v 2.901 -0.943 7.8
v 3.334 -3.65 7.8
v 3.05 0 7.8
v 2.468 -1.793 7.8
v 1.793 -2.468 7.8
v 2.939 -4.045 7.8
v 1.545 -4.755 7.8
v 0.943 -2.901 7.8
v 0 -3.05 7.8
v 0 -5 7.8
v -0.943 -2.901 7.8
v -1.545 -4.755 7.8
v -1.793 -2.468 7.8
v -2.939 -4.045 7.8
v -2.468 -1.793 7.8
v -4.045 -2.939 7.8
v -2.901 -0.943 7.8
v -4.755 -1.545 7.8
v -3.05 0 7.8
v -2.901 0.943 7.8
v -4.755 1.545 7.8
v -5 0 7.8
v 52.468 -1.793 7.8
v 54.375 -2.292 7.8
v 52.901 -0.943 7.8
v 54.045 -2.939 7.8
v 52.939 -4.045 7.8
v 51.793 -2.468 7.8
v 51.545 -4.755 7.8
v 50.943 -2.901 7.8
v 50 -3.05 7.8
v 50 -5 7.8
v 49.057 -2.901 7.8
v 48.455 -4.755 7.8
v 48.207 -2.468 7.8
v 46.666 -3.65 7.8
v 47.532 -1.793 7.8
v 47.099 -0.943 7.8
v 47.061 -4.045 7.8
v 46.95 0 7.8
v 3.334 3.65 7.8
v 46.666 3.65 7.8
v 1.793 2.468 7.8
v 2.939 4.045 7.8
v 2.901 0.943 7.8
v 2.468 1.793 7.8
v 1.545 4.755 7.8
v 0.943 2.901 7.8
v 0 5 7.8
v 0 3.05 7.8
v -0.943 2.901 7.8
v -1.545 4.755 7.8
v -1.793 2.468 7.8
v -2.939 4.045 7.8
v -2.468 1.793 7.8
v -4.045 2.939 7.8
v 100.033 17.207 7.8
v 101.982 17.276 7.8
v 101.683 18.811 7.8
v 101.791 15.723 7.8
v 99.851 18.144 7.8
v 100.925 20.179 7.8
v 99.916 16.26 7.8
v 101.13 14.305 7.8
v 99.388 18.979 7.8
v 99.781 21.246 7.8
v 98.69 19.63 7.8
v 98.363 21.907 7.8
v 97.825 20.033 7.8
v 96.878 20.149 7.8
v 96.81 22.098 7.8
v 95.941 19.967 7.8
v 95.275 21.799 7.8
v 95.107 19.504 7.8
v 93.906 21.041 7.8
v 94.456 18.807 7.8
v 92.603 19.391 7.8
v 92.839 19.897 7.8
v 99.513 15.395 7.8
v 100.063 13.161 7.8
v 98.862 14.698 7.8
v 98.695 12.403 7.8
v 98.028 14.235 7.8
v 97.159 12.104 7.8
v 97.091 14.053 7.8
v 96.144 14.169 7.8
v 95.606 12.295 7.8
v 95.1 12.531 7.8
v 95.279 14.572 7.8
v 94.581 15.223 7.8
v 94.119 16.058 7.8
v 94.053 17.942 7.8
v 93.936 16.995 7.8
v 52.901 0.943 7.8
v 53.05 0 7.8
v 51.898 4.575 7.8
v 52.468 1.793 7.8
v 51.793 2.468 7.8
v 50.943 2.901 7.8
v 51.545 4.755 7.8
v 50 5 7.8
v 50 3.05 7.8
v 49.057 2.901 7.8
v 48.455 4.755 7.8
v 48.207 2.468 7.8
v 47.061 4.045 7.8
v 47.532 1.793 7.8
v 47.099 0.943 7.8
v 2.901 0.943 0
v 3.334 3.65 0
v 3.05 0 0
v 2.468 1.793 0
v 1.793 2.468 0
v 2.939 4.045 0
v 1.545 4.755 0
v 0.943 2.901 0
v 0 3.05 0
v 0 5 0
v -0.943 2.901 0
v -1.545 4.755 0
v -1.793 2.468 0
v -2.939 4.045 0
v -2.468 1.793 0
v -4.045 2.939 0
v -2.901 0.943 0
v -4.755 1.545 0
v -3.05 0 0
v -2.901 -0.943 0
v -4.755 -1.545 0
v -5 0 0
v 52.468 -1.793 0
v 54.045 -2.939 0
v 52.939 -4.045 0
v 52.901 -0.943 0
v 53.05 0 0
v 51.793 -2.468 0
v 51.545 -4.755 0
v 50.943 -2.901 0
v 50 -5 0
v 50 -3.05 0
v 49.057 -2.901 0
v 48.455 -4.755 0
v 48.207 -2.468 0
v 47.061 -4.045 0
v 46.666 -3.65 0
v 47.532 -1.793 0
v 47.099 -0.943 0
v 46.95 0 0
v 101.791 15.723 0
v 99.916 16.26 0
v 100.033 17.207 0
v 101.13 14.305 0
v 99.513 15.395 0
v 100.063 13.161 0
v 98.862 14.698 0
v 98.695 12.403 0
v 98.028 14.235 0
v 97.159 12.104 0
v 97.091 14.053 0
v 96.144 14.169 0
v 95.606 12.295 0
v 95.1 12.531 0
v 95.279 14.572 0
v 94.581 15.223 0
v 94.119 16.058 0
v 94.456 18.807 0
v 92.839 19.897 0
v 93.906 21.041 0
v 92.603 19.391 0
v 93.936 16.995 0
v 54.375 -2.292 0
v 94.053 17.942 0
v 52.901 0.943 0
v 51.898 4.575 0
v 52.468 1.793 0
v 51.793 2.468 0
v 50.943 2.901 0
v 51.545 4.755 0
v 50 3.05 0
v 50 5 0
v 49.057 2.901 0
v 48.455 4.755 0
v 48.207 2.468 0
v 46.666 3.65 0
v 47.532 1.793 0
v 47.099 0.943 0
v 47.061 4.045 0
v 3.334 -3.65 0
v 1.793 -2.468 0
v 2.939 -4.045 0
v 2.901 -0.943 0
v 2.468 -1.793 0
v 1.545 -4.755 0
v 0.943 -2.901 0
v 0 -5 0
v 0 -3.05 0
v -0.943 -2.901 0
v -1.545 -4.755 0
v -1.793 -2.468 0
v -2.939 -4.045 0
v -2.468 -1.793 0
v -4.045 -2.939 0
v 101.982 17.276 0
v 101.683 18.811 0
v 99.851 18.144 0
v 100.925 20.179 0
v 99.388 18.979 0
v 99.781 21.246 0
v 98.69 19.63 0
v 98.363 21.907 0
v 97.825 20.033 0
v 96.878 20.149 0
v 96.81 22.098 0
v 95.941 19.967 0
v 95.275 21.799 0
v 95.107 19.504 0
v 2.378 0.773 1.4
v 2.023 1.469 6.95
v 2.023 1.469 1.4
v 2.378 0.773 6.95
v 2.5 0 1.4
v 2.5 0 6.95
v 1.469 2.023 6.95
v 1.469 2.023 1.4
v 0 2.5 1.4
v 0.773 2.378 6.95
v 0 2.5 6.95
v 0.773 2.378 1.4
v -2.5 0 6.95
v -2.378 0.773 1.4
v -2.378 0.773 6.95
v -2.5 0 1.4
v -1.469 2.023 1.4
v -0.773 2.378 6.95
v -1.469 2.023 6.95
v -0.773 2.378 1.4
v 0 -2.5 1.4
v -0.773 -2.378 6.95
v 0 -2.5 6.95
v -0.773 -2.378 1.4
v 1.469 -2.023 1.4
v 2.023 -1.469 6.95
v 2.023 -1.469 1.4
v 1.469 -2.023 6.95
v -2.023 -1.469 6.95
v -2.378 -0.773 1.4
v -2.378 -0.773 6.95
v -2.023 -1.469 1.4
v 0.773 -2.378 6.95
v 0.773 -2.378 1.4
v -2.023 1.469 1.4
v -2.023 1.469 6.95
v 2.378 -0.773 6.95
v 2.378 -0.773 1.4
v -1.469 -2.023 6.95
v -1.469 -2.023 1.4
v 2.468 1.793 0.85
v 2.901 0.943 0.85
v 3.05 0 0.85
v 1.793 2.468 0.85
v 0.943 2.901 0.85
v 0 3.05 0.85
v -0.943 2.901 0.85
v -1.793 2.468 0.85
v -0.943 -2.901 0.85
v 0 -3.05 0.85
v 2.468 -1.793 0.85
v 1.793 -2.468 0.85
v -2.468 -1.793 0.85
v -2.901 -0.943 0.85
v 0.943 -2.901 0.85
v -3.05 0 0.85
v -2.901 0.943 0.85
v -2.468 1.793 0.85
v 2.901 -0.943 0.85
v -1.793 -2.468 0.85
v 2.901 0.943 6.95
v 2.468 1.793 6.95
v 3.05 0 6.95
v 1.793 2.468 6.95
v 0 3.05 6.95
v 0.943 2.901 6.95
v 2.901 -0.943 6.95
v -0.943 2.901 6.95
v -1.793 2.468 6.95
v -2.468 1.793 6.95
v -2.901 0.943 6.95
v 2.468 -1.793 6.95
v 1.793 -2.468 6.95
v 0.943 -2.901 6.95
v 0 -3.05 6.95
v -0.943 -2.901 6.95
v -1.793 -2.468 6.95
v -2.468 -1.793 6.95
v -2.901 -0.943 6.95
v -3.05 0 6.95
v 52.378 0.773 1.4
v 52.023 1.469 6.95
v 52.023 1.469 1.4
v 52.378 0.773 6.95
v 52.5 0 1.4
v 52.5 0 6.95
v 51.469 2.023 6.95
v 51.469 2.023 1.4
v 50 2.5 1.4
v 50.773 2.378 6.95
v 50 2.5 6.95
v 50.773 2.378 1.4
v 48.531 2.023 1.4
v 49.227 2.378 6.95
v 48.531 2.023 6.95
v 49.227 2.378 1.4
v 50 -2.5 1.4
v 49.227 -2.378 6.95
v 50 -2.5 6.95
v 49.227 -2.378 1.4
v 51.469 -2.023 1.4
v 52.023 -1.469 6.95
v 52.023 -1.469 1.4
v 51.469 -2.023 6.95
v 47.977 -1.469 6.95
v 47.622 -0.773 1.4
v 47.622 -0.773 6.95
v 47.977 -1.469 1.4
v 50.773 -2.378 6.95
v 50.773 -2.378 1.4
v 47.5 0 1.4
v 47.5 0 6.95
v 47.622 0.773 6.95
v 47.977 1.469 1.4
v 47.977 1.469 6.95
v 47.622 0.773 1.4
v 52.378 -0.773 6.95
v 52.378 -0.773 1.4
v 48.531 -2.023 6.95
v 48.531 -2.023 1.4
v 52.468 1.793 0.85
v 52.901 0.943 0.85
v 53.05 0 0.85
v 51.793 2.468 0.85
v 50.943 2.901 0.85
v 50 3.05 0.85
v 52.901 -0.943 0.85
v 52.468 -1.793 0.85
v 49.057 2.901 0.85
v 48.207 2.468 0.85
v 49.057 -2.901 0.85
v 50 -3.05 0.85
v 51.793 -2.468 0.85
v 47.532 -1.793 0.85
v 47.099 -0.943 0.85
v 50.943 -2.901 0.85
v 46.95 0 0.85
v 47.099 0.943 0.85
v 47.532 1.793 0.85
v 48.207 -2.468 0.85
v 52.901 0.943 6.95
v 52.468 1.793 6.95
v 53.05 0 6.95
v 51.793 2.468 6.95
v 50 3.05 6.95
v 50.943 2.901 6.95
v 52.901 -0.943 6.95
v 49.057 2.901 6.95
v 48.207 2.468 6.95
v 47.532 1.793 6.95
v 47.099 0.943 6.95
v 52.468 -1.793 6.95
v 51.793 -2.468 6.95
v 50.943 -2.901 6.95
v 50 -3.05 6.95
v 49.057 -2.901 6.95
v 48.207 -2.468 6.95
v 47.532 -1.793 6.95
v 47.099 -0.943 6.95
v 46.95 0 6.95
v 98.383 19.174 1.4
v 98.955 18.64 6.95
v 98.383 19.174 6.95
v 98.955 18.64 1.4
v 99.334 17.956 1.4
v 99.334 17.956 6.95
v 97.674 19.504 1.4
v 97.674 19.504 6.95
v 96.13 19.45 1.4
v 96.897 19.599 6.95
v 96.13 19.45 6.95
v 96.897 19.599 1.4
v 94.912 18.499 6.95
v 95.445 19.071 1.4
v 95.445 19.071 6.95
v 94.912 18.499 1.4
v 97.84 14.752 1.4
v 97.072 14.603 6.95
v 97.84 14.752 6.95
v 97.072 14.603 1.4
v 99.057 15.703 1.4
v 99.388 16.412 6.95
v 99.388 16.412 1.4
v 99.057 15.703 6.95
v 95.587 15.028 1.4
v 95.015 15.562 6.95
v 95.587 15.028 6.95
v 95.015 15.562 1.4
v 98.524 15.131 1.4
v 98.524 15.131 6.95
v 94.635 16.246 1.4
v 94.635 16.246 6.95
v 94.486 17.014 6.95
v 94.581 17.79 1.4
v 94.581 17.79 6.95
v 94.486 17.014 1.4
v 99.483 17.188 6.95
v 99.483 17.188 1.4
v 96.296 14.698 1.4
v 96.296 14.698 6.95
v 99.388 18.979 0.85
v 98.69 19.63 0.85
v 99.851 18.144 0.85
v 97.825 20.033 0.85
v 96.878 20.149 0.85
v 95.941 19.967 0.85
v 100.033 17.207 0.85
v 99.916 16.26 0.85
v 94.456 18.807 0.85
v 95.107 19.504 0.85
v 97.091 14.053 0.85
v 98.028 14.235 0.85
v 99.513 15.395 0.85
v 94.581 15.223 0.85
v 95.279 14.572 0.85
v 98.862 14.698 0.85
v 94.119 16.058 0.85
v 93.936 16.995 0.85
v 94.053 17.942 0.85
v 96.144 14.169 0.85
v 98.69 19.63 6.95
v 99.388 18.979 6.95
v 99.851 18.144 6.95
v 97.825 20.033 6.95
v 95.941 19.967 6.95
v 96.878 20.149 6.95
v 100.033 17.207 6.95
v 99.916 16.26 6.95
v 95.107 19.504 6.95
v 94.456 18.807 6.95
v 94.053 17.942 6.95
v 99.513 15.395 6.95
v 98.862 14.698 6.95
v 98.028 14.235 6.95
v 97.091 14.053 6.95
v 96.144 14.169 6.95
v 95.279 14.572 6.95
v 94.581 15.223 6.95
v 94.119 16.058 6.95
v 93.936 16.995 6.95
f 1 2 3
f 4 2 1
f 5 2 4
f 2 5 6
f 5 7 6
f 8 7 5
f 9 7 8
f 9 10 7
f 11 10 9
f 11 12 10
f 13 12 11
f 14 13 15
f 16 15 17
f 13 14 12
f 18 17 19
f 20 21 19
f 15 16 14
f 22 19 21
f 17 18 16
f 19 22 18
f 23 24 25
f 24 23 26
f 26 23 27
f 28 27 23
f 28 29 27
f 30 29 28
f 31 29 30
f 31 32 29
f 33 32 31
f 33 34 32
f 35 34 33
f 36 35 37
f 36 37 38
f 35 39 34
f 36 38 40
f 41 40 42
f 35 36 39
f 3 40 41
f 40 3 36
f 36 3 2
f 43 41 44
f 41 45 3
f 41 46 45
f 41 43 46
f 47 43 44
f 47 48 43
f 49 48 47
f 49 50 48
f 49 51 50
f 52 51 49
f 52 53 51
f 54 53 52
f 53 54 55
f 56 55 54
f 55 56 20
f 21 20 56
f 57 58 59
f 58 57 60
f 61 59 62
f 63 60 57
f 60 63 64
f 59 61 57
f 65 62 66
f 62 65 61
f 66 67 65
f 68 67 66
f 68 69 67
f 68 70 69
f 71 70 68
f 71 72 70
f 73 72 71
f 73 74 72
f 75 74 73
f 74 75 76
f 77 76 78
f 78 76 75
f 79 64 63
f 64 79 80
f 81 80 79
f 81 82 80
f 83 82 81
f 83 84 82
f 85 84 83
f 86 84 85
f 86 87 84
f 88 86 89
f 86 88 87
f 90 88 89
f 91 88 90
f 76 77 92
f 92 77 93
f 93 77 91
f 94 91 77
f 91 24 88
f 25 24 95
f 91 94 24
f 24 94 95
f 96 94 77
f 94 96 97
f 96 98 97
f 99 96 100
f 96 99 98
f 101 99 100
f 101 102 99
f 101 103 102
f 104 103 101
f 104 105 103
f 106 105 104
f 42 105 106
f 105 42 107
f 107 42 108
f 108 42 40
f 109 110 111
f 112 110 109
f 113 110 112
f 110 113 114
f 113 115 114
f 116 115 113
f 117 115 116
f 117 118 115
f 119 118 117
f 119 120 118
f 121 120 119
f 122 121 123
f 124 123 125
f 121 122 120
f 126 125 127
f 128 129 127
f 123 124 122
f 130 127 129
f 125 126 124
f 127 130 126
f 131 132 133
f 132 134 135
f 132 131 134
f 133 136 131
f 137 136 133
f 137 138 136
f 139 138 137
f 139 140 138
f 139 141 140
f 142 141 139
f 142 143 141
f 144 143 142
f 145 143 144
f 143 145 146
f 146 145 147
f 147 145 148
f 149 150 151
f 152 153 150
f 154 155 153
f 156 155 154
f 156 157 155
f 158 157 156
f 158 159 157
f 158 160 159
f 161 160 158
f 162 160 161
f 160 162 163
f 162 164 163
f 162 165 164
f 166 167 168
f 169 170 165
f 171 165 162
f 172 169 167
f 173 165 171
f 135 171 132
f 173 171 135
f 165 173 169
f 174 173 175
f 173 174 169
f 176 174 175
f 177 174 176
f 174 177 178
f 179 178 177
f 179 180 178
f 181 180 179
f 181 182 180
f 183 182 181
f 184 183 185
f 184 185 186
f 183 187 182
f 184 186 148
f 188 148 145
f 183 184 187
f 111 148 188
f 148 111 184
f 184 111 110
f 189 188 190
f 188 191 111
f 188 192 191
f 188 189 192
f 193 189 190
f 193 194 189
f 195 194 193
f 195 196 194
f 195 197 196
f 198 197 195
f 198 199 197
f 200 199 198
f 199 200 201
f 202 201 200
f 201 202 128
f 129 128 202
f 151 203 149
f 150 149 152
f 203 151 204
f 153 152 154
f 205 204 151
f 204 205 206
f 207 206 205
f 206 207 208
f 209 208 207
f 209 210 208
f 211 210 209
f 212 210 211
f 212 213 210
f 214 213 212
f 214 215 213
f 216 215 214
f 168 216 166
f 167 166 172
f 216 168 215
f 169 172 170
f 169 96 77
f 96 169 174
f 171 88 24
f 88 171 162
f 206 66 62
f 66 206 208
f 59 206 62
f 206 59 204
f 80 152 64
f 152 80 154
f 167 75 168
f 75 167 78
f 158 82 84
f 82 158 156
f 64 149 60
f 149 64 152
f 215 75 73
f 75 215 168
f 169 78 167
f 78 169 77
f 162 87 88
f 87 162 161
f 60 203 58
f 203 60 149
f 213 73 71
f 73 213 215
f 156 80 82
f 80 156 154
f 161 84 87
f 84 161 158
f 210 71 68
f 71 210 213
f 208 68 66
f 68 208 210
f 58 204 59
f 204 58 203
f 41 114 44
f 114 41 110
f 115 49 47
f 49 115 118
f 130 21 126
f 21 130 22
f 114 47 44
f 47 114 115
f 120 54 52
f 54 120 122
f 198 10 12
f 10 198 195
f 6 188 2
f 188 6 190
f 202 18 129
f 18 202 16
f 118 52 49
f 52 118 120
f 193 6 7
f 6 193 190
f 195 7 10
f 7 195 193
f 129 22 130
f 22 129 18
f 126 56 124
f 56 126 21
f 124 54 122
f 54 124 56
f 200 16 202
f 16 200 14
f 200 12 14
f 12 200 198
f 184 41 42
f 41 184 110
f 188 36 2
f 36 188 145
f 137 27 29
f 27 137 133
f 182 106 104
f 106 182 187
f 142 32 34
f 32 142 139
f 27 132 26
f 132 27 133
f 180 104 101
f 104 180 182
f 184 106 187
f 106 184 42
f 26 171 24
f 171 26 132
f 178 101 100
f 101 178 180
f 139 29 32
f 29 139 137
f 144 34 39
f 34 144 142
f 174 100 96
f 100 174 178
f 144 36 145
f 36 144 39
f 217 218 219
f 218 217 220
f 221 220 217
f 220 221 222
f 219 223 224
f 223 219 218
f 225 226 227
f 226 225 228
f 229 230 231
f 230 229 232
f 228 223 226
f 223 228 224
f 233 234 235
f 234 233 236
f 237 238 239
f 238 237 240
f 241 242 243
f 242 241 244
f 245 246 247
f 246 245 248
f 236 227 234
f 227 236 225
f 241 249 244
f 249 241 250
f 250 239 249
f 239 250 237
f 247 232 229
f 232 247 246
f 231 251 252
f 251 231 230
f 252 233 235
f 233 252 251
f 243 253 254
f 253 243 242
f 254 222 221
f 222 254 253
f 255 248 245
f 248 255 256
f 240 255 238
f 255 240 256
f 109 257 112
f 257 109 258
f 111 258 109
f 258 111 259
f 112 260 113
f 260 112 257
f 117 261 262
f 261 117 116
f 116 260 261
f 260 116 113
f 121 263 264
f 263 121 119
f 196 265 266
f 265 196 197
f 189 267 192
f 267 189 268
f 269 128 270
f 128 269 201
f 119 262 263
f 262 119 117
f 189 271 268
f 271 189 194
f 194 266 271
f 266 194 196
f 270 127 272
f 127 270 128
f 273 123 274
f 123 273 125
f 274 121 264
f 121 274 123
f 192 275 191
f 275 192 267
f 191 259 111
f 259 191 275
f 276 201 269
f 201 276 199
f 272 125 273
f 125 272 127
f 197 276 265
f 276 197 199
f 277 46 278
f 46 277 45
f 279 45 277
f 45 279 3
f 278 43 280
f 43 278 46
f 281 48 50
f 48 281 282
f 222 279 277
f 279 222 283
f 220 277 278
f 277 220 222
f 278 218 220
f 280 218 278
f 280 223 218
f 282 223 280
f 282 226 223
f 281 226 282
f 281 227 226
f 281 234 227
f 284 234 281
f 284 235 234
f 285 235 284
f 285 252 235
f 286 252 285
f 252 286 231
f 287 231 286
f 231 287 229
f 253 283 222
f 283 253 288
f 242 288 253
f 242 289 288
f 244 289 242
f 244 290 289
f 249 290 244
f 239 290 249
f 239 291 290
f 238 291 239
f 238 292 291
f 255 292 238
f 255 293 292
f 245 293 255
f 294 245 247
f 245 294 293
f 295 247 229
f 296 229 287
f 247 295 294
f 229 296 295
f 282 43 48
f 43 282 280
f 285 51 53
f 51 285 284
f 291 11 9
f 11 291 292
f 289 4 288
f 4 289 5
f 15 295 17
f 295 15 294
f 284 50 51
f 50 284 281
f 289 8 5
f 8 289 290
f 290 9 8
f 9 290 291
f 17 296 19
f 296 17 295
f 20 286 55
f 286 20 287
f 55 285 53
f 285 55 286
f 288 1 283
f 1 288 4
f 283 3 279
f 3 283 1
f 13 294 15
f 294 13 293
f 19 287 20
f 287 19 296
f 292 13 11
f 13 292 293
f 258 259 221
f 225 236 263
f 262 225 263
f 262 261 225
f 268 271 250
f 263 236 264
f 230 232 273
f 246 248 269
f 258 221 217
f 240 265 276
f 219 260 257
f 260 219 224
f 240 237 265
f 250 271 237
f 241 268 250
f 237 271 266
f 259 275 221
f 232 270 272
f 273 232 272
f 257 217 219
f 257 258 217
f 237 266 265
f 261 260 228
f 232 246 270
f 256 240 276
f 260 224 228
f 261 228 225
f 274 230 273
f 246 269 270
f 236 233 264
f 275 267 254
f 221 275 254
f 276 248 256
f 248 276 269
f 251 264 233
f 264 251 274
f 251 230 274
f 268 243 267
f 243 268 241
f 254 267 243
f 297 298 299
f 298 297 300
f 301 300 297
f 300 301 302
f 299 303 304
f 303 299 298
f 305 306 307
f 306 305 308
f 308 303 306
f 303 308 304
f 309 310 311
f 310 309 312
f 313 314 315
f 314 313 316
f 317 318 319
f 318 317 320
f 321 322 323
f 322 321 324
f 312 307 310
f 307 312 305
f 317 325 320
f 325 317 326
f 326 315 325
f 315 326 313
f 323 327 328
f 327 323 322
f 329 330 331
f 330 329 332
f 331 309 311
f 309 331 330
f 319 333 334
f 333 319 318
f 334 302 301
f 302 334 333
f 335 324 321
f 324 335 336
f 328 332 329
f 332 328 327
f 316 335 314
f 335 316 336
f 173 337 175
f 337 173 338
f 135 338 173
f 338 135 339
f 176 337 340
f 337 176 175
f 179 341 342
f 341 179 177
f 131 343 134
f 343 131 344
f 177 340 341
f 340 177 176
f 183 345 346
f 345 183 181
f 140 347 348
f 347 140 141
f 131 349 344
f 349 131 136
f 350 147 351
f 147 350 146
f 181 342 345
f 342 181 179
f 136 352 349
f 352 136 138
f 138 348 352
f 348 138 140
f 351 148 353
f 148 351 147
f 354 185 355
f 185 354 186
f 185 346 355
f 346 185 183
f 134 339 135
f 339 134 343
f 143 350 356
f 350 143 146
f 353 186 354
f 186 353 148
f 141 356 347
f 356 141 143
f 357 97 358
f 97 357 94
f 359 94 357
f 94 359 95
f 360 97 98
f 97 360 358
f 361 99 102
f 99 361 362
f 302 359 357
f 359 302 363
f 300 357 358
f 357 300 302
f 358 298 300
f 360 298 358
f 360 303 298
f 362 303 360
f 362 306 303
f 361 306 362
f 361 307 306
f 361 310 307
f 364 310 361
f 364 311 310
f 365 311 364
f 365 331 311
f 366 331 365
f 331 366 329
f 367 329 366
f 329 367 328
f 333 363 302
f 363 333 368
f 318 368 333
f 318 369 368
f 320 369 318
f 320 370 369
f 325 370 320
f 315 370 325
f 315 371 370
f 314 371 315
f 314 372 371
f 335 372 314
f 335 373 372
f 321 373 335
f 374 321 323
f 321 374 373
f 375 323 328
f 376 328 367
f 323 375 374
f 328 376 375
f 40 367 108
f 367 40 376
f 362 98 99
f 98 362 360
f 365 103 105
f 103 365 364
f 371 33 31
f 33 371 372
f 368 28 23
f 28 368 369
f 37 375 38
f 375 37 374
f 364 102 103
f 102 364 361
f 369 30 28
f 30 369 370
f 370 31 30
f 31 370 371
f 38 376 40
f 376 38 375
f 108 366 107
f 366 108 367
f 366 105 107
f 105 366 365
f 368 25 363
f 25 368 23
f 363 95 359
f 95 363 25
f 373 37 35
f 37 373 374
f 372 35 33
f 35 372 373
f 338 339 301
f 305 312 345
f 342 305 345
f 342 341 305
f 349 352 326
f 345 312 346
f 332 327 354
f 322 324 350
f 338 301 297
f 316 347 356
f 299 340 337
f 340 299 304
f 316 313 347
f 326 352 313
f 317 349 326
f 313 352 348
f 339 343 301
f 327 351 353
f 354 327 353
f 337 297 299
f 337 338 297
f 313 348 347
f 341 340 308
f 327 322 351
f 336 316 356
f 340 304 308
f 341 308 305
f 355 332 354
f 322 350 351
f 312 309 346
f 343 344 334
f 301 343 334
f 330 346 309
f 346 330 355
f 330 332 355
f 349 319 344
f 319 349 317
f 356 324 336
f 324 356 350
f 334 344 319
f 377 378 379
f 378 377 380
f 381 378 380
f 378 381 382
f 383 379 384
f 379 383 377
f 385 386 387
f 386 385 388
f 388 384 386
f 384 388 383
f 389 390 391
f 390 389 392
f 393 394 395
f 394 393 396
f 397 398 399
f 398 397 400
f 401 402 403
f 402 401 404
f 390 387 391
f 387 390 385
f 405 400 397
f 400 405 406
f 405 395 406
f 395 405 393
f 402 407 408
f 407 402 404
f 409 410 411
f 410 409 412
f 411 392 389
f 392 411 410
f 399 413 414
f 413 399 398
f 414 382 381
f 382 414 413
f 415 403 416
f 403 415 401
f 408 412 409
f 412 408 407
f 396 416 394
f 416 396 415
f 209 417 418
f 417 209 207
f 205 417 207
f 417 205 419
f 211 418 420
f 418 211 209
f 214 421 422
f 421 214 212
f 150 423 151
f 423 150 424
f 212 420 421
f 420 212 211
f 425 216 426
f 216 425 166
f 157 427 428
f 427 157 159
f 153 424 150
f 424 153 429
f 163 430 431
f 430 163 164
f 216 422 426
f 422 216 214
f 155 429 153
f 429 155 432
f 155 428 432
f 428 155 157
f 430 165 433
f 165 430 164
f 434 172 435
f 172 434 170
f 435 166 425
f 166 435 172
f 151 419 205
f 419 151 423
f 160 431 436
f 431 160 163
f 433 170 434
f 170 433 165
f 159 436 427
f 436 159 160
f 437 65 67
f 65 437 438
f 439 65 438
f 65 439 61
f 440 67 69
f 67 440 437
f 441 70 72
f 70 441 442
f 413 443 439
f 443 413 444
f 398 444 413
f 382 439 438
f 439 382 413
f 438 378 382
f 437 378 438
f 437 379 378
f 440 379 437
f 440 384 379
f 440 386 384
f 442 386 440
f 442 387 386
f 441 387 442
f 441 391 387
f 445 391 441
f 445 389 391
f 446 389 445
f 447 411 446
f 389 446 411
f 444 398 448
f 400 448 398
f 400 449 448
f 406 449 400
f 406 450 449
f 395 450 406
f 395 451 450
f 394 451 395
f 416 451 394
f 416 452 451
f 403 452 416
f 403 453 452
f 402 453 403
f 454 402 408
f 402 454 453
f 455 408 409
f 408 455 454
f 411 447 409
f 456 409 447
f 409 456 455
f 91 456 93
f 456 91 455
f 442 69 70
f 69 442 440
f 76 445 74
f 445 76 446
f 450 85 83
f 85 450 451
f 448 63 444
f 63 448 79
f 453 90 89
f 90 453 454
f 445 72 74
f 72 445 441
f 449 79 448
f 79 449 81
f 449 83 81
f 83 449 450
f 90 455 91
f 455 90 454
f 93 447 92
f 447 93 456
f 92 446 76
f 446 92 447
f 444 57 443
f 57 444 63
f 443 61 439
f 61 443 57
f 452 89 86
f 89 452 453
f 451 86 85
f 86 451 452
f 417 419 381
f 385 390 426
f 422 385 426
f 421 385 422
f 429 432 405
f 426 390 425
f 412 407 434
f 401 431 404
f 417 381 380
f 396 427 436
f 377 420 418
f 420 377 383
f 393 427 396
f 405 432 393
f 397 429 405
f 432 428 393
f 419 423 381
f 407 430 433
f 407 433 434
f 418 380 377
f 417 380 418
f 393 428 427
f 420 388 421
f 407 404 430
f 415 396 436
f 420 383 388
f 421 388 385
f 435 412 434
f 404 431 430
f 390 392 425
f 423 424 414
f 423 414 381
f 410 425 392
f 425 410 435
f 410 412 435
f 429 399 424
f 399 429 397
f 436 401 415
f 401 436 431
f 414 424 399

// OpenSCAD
/*      
Customizable freeform-3-hole LEGO Technic Connector Bone
Jens Henrik Sandell
July 2016
Updated December 2016

Created by forking the thing:629875
        Customizable Curved LEGO Technic Beam
        Steve Medwin
        January 2015
*/
$fn=20*1.0;
// preview[view:north east, tilt:top]

// constants
width = 7.3*1.0; // beam width
height = 7.8*1.0; // beam height
hole = 5.0/2; // hole diameter
counter = 6.1/2; // countersink diameter
depth = 0.85*1.0; // countersink depth
pitch = 8.0*1.0; // distance between holes

// user parameters
// distance between first and mid hole =
Distance1 = 50; // [20:100]
// distance between mid and last hole =
Distance2 = 50; // [20:60]
// width of knuckle and ends =
Knuckle = 10; // [8:16]
// angle between first and second bone =
AngleBones = 20.0; // [0.0:90]

// calculations
// create beam
difference()
{
	union(){
		cylinder(h=height, r=Knuckle/2);
		translate([0,-width/2,0]) cube([Distance1,width,height]);
		translate([Distance1,0,0]) cylinder(h=height,r=Knuckle/2);

		translate([Distance1,0,0]) rotate([0,0,AngleBones]) {
			translate([0,-width/2,0]) cube([Distance2,width,height]);
			translate([Distance2,0,0]) cylinder(h=height,r=Knuckle/2);
		}
	}
	for (i=[0:1]) {
		translate([i*Distance1,0,0]) {
			translate([0,0,-2])
			cylinder(h=height+4, r=hole);
                
			translate([0,0,-0.01])
			cylinder(h=depth+0.01, r=counter);      
                
			translate([0,0,height-depth])
			cylinder(h=depth+0.01, r=counter);
                
			translate([0,0,depth])
			cylinder(h=(counter - hole), r1=counter, r2=hole);           
		}    
	}
	translate([Distance1,0,0]) rotate([0,0,AngleBones]) translate([Distance2,0,0]) {
		translate([0,0,-2])
		cylinder(h=height+4, r=hole);
               
		translate([0,0,-0.01])
		cylinder(h=depth+0.01, r=counter);      
                
		translate([0,0,height-depth])
		cylinder(h=depth+0.01, r=counter);
                
		translate([0,0,depth])
		cylinder(h=(counter - hole), r1=counter, r2=hole);           
	}    
}

